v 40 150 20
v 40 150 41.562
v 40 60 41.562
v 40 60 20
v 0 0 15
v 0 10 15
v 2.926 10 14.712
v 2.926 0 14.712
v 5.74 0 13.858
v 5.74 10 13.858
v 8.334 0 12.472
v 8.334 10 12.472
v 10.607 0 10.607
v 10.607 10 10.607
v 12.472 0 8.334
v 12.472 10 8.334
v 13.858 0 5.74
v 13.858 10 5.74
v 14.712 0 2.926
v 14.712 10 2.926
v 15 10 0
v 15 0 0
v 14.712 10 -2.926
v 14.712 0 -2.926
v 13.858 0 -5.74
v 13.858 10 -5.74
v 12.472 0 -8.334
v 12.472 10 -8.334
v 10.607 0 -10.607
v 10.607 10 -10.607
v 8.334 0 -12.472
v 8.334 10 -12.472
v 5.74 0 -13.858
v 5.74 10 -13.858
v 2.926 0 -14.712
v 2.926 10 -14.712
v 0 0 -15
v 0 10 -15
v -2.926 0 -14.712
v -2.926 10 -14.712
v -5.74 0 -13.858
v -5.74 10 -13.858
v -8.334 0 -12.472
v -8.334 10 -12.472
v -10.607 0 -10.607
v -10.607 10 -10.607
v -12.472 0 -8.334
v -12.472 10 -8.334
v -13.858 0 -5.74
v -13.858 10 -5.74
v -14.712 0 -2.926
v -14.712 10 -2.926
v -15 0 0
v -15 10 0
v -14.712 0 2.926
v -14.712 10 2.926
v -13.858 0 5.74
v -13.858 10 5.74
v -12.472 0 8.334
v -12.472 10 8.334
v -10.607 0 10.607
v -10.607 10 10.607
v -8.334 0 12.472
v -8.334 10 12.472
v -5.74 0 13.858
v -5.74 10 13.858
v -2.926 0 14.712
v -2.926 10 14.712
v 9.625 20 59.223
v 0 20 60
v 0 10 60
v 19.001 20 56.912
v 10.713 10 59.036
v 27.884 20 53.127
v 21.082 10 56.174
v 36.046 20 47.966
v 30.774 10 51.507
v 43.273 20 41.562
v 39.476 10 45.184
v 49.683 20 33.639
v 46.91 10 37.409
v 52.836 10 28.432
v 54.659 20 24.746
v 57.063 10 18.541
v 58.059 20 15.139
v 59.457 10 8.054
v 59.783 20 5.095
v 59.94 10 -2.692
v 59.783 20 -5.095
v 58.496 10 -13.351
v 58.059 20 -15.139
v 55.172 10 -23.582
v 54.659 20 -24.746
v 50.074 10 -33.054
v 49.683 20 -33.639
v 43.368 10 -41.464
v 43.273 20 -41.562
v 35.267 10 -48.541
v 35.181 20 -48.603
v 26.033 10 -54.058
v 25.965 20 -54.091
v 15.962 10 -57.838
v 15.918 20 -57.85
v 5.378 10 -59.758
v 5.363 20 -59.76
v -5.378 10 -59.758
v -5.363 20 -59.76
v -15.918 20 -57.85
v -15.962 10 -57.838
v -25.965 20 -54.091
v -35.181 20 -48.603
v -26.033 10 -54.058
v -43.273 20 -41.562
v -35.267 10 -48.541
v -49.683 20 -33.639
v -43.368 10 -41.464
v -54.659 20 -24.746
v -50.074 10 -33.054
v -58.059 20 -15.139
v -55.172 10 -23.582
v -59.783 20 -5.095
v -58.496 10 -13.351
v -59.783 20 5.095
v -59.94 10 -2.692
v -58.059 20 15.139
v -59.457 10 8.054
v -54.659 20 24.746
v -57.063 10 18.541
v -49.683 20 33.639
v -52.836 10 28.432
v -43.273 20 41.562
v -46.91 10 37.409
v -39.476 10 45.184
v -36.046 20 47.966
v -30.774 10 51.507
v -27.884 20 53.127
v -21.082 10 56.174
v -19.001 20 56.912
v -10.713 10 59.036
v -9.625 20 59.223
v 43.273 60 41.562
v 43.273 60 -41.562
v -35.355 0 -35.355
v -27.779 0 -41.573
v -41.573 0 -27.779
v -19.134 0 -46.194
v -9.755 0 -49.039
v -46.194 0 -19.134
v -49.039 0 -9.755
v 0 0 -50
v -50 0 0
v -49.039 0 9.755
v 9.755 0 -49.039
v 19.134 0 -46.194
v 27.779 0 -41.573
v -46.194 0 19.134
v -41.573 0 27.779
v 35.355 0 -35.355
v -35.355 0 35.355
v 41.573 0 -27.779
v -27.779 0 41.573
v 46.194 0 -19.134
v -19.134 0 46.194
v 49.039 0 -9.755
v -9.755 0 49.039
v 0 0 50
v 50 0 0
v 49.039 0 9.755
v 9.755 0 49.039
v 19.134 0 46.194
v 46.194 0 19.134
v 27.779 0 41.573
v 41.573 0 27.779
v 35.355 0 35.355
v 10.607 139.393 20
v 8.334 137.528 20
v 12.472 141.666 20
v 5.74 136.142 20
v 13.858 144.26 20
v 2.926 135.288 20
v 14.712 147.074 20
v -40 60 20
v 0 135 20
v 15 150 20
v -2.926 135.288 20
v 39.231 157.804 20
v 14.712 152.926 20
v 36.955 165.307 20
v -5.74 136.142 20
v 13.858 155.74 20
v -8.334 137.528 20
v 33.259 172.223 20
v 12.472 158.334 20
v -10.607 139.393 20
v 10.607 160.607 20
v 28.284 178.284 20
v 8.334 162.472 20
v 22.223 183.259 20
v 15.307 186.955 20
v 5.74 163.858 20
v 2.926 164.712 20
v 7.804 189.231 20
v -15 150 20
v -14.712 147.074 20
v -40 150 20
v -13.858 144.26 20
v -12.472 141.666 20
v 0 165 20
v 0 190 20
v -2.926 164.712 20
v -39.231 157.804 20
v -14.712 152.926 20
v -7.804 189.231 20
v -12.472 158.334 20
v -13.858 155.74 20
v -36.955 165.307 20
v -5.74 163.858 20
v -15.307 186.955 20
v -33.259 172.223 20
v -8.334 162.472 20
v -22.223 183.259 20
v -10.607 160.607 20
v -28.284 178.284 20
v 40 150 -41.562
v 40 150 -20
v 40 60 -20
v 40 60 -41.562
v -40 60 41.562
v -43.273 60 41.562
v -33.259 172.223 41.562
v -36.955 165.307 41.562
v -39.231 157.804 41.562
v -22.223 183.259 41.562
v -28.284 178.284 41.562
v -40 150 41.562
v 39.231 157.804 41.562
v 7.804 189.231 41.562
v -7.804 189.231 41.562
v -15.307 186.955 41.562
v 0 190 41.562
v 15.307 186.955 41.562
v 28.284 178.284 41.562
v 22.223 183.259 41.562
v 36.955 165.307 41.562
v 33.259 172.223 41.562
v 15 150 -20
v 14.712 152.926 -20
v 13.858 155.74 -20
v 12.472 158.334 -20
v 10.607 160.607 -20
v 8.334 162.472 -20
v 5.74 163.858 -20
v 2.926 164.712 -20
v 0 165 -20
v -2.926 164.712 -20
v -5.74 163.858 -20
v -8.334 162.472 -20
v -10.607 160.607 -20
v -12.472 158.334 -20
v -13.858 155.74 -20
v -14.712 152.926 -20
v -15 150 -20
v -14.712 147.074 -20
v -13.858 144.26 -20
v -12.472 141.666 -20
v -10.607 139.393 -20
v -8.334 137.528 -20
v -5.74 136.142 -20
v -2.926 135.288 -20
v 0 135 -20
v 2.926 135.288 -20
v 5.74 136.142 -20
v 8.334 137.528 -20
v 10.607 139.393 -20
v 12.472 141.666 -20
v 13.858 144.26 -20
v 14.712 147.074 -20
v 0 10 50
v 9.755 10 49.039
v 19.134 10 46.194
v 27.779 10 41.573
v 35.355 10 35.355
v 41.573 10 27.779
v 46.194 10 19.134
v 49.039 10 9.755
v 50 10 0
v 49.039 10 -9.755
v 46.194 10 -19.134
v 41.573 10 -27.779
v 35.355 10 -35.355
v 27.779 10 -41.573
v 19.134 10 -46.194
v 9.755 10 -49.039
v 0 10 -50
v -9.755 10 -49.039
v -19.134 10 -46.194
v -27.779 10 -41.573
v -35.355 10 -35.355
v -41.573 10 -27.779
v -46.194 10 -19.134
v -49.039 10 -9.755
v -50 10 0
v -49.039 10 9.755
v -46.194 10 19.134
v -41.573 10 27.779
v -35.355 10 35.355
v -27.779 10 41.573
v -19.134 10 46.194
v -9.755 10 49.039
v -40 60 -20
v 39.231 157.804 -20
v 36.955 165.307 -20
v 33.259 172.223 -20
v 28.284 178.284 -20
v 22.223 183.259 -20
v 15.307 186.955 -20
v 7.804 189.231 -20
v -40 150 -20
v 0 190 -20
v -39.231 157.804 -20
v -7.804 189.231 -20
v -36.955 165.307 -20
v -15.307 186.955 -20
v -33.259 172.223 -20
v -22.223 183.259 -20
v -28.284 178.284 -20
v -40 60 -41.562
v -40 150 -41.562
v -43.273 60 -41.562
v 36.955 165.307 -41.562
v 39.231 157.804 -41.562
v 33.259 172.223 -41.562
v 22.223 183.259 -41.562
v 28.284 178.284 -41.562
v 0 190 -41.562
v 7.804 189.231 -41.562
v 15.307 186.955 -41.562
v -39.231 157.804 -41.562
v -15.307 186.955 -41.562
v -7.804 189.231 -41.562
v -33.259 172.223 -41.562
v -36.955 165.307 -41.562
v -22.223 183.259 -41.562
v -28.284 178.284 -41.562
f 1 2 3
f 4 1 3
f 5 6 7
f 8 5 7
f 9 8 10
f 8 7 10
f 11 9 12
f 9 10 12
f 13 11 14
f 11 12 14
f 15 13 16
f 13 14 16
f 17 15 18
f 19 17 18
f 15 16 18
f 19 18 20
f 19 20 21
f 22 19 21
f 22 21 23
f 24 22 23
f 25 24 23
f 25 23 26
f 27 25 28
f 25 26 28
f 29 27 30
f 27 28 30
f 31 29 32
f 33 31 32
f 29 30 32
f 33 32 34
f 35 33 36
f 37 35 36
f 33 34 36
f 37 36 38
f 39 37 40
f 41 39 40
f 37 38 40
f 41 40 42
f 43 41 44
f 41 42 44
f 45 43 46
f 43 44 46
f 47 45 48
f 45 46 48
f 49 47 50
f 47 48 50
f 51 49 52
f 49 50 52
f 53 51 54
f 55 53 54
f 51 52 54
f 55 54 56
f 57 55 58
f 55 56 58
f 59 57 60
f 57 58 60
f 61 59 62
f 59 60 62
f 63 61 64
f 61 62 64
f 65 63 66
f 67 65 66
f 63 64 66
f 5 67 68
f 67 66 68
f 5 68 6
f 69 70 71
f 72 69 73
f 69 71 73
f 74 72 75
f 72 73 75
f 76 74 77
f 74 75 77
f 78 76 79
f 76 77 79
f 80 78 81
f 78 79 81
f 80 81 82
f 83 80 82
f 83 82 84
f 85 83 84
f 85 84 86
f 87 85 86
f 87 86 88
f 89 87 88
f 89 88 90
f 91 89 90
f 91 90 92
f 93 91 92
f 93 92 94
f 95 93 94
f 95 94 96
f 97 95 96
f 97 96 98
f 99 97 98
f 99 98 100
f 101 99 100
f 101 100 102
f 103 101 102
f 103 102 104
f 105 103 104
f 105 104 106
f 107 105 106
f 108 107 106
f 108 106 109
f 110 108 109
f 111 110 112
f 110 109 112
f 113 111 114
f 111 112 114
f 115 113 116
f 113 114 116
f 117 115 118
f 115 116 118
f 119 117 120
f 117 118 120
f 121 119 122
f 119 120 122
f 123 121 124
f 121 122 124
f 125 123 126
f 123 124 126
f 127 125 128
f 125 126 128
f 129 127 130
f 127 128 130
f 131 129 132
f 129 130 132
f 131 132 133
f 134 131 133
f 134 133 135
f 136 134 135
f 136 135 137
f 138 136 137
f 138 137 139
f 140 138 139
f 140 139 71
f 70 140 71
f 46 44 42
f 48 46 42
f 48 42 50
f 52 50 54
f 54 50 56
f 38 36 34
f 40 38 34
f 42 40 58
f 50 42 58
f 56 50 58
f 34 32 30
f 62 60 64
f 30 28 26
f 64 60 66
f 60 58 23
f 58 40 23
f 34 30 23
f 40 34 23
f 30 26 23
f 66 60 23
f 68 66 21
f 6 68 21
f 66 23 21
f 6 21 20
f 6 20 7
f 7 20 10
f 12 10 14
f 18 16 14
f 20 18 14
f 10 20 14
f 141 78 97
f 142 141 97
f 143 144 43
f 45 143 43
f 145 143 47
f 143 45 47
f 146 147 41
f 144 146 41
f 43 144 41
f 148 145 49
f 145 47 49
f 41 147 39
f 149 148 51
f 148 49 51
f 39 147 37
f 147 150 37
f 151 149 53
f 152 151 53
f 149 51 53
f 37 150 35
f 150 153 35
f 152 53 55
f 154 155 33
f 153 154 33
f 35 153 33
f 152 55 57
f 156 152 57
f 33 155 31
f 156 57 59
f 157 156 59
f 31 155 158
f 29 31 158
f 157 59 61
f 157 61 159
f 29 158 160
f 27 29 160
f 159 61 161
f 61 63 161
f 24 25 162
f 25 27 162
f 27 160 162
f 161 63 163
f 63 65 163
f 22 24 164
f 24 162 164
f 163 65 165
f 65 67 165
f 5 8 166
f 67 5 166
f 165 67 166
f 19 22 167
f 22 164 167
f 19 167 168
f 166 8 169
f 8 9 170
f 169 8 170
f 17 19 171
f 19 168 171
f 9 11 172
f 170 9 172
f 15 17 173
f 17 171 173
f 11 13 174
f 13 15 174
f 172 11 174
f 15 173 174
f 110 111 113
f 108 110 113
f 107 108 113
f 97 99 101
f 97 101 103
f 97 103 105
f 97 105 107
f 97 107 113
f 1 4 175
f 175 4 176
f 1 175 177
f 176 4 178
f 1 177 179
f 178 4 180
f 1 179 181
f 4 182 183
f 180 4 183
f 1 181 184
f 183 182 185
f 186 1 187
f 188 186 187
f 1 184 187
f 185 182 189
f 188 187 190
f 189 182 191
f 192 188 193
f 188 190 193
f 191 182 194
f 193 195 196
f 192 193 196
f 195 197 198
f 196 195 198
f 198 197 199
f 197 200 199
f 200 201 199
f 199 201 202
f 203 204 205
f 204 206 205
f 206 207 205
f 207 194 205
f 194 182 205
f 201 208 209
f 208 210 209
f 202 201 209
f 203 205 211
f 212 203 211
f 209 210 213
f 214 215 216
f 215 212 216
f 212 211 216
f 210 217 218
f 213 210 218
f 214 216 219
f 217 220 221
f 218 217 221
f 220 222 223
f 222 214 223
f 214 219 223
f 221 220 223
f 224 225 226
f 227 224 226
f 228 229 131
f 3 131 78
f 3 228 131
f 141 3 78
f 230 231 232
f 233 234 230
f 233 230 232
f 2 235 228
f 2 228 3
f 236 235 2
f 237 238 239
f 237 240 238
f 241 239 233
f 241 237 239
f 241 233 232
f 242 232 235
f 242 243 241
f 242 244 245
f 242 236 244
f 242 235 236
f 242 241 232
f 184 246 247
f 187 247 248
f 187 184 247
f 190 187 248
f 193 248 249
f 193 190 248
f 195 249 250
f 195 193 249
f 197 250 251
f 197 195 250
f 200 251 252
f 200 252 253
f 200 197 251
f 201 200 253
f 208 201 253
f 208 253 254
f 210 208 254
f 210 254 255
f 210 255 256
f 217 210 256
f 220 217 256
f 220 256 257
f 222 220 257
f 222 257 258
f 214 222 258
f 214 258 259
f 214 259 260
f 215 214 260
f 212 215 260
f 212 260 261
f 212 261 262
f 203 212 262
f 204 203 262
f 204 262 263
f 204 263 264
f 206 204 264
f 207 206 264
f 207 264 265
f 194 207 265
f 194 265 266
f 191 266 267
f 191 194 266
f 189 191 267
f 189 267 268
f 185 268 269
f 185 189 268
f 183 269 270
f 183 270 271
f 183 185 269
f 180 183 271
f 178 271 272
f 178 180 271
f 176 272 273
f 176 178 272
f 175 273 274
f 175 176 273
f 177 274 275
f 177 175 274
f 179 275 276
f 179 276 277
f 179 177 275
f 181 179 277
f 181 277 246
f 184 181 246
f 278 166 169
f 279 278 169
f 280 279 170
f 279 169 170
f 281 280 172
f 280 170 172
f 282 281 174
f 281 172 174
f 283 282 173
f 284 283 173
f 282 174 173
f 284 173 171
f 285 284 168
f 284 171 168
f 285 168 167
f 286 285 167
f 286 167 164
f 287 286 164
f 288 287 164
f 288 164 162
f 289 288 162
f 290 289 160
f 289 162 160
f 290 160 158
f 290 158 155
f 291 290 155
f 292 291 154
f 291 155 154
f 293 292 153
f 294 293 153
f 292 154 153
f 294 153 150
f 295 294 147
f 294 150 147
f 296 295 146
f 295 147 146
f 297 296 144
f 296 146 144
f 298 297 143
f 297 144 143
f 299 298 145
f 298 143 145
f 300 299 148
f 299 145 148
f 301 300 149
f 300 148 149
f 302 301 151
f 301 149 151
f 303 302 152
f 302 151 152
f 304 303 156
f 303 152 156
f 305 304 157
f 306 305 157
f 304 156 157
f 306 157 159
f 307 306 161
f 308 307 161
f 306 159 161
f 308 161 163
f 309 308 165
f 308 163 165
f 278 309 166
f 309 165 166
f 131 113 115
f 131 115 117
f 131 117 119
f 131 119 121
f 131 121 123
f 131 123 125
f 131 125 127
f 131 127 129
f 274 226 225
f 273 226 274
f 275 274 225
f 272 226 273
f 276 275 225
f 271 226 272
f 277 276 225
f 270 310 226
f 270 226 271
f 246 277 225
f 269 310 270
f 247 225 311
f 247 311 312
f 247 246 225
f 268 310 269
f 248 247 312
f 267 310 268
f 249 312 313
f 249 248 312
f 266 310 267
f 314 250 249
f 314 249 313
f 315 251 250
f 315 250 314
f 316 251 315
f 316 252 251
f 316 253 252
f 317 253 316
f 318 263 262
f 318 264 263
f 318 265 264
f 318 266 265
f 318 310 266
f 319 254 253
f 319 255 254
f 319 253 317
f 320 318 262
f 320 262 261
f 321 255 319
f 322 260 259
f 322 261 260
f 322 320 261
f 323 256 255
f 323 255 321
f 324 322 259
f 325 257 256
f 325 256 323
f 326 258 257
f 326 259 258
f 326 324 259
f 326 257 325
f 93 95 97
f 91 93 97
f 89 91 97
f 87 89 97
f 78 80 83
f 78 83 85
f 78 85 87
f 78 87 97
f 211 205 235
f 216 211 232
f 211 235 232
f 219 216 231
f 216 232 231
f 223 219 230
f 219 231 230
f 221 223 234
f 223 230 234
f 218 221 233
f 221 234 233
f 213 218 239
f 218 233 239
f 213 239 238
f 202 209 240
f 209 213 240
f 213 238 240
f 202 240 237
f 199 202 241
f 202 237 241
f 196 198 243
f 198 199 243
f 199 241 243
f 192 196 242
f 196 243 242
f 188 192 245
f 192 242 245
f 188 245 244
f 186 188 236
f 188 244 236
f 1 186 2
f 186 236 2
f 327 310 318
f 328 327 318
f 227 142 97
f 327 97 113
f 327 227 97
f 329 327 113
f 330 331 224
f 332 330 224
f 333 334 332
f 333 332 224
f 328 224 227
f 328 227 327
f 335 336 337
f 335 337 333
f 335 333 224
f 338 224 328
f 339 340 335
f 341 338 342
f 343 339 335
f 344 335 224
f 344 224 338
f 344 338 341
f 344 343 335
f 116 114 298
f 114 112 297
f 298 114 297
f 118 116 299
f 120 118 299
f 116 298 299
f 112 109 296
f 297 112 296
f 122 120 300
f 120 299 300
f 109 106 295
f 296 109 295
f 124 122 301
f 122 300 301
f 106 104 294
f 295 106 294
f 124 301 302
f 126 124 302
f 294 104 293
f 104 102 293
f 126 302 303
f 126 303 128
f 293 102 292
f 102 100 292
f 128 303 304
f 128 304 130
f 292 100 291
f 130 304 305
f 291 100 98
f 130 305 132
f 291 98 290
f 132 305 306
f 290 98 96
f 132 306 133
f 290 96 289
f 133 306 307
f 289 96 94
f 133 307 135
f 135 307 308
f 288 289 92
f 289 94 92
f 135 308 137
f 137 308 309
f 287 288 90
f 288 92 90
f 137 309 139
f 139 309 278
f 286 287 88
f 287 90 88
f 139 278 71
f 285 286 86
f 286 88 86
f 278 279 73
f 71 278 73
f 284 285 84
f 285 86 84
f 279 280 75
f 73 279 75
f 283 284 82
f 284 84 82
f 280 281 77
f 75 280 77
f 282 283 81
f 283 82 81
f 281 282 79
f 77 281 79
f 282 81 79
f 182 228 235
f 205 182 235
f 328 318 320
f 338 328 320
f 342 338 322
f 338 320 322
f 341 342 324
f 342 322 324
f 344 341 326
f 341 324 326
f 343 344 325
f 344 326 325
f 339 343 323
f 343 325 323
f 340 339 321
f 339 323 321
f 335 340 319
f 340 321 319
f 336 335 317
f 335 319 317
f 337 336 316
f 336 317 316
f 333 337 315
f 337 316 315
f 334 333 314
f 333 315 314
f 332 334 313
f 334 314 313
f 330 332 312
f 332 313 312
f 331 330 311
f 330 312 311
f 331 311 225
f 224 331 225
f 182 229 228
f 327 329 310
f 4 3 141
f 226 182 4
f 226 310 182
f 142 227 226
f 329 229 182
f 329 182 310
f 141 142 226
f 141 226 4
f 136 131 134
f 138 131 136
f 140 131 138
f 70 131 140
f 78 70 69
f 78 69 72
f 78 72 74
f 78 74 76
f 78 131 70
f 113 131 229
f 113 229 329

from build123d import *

# Parameters (mm, degrees)
SKETCH1_R            = 50
BOSS_EXTRUDE1_DEPTH  = 10
SKETCH2_R            = 15
CUT_EXTRUDE1_DEPTH   = 10
SKETCH3_R            = 60
BOSS_EXTRUDE2_DEPTH  = 10
SKETCH4_W            = 86.5466222
SKETCH4_H            = 83.124498108
BOSS_EXTRUDE3_DEPTH  = 40
BOSS_EXTRUDE9_DEPTH  = 83.124498108
SKETCH16_W           = 40
SKETCH16_H           = 180
CUT_EXTRUDE6_DEPTH   = 1000
SKETCH17_R           = 15
BOSS_EXTRUDE10_DEPTH = 61.562249054


with BuildPart() as part:
    # Sketch1 → Boss-Extrude1 (new body)
    with BuildSketch(Plane(origin=(0, 0, 0), x_dir=(1, 0, 0), z_dir=(0, 1, 0))):
        with Locations(Location((0, 0, 0), (0, 0, 270))):
            Circle(SKETCH1_R)
    extrude(amount=BOSS_EXTRUDE1_DEPTH)

    # Sketch2 → Cut-Extrude1 (cut)
    with BuildSketch(Plane(origin=(0, 10, 0), x_dir=(1, 0, 0), z_dir=(0, 1, 0))):
        with Locations(Location((0, 0, 0), (0, 0, 270))):
            Circle(SKETCH2_R)
    extrude(amount=-CUT_EXTRUDE1_DEPTH, mode=Mode.SUBTRACT)

    # Sketch3 → Boss-Extrude2 (add)
    with BuildSketch(Plane(origin=(0, 10, 0), x_dir=(1, 0, 0), z_dir=(0, 1, 0))):
        with Locations(Location((0, 0, 0), (0, 0, 270))):
            Circle(SKETCH3_R)
    extrude(amount=BOSS_EXTRUDE2_DEPTH)

    # Sketch4 → Boss-Extrude3 (add)
    with BuildSketch(Plane(origin=(0, 20, 0), x_dir=(1, 0, 0), z_dir=(0, 1, 0))):
        Rectangle(SKETCH4_W, SKETCH4_H)
    extrude(amount=BOSS_EXTRUDE3_DEPTH)

    # Sketch15 → Boss-Extrude9 (add)
    with BuildSketch(Plane.XY.offset(41.562249054)):
        with BuildLine():
            Line((-40, 60), (-40, 150))
            ThreePointArc((-40, 150), (0, 190), (40, 150))
            Line((40, 150), (40, 60))
            ThreePointArc((40, 60), (0, 20), (-40, 60))
        make_face()
    extrude(amount=-BOSS_EXTRUDE9_DEPTH)

    # Sketch16 → Cut-Extrude6 (cut)
    with BuildSketch(Plane.ZY.offset(40)):
        with Locations((0, 150)):
            Rectangle(SKETCH16_W, SKETCH16_H)
    extrude(amount=-CUT_EXTRUDE6_DEPTH, mode=Mode.SUBTRACT)

    # Sketch17 → Boss-Extrude10 (add)
    with BuildSketch(Plane.XY.offset(41.562249054)):
        with Locations((0, 150)):
            Circle(SKETCH17_R)
    extrude(amount=-BOSS_EXTRUDE10_DEPTH)


solid = part.part
